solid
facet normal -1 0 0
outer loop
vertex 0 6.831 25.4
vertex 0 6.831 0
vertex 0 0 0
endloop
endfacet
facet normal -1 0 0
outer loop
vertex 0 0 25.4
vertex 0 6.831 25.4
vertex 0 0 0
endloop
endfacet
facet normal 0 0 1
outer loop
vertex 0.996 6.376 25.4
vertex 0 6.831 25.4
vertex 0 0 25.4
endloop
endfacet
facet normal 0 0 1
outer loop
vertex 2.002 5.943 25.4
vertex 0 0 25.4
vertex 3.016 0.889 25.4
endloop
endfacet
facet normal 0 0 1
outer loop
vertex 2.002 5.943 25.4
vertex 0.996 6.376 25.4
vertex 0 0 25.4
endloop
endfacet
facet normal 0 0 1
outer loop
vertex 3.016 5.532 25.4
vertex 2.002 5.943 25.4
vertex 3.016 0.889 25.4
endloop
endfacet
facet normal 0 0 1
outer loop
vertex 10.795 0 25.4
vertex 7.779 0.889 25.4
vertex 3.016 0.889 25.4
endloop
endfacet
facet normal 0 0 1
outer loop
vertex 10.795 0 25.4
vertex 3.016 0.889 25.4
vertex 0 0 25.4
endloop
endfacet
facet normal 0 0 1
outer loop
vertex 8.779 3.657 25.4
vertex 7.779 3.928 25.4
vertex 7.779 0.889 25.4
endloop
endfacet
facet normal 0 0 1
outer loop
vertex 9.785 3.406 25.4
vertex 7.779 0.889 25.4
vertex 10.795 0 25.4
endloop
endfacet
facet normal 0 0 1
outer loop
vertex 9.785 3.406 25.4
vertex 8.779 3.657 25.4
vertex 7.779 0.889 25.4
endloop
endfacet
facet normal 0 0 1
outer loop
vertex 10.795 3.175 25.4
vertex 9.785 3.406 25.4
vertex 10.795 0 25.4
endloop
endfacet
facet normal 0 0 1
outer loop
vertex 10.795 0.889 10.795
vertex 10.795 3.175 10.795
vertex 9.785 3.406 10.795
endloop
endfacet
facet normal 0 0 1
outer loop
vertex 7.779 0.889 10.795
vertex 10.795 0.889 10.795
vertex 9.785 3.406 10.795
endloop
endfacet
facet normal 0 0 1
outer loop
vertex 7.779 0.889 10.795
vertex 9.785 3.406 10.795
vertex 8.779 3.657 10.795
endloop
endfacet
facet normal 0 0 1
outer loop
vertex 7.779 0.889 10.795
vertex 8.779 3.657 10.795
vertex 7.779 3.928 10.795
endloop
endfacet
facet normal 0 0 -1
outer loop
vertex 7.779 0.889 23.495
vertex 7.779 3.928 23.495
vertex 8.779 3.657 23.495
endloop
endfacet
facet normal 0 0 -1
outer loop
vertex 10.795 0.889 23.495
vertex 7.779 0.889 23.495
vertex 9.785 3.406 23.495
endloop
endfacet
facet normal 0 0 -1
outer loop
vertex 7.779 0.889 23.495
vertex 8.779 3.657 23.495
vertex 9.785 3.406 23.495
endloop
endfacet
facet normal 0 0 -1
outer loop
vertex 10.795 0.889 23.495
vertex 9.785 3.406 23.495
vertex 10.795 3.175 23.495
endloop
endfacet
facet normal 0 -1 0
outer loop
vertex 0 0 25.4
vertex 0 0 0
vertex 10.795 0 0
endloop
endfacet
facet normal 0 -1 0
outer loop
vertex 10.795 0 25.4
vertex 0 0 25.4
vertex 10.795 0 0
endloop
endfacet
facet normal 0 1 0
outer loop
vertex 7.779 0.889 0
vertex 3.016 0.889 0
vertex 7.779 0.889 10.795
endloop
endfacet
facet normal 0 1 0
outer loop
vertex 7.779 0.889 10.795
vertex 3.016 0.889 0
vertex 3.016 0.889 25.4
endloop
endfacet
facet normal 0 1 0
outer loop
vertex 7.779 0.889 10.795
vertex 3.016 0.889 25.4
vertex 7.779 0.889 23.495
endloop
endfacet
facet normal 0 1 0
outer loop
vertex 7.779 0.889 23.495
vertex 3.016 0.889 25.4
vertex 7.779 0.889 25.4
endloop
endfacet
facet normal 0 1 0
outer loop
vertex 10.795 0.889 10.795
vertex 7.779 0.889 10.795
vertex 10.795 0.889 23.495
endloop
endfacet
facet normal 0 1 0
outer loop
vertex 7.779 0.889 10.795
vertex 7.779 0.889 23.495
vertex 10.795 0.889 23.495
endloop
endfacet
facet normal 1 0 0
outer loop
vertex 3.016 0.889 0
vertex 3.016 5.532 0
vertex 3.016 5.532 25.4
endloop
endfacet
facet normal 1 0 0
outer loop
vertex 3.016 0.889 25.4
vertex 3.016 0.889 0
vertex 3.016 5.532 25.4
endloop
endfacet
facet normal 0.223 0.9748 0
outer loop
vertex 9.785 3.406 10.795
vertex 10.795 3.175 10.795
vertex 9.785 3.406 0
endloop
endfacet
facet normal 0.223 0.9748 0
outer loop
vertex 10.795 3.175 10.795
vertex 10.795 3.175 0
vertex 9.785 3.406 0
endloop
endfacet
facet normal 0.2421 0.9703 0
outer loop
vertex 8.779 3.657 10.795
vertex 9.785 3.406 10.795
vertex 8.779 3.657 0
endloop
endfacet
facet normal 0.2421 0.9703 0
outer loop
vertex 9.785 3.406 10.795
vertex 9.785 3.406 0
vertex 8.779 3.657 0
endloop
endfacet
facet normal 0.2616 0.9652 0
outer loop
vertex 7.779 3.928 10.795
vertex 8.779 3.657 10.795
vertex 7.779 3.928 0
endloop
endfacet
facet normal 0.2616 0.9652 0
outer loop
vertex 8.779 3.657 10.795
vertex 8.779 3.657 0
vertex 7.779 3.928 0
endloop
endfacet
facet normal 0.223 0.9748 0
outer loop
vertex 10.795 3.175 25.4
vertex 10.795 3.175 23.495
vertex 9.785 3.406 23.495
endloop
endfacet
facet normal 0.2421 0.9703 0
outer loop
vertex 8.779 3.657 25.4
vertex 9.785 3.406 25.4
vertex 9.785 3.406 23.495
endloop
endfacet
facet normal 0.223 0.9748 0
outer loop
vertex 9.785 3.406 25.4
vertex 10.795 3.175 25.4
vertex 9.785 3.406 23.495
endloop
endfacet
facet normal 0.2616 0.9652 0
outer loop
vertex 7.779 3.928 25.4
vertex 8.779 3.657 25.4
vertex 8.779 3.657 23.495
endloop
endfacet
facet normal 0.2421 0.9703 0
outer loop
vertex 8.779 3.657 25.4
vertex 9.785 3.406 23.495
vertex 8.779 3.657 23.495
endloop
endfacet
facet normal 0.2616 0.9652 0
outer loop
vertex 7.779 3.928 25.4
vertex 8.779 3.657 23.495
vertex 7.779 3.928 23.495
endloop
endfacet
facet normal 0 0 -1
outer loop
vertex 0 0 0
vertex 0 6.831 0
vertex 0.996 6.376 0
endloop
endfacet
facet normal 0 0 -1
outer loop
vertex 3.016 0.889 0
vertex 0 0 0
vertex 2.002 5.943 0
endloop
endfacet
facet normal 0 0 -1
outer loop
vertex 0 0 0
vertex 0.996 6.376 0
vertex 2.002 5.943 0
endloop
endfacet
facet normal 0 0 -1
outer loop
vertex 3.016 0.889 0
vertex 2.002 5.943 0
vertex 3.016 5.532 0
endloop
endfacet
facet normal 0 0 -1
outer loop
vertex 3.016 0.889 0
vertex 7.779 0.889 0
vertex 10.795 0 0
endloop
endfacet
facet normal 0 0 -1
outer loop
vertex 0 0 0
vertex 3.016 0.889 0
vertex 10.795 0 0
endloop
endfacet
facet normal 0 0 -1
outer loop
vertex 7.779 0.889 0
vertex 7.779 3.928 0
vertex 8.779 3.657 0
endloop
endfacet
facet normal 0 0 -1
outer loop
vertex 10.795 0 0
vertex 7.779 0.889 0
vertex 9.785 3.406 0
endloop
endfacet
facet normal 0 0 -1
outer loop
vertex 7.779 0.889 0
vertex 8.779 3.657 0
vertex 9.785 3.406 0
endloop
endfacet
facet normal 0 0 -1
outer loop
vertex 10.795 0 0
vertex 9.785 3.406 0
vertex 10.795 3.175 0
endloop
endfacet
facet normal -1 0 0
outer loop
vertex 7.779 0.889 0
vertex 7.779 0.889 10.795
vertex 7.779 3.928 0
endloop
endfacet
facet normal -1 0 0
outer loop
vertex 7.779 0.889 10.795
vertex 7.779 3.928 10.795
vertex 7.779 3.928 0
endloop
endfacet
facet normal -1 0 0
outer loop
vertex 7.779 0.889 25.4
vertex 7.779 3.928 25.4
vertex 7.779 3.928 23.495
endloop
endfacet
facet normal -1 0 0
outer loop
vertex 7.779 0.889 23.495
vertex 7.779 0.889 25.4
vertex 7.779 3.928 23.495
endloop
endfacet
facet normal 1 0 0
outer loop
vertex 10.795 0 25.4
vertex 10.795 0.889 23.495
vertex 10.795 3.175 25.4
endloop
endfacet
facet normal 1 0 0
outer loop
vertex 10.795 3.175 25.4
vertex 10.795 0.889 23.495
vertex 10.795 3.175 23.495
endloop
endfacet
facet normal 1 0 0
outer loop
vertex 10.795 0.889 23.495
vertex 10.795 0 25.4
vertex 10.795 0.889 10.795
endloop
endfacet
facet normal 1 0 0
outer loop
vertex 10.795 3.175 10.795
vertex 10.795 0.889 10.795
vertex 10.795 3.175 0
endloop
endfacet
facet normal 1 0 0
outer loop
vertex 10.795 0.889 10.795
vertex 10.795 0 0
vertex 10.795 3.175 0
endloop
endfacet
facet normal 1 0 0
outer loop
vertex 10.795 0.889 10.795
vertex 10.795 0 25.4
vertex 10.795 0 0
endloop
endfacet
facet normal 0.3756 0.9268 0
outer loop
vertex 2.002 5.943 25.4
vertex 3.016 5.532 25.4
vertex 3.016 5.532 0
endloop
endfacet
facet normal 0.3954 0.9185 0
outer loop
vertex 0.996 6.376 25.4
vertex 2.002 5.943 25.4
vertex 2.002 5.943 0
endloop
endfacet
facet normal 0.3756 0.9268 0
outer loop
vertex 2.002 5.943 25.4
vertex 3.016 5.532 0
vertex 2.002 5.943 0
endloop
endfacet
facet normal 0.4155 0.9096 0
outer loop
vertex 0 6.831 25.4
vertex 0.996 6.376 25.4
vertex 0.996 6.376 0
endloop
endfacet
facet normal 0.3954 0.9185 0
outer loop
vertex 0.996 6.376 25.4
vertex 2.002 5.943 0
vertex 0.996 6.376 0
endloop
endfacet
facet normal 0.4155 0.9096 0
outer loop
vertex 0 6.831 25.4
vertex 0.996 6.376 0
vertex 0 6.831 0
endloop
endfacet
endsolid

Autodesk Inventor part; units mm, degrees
ref_plane "YZ Plane" through (0, 0, 0) normal (1, 0, 0) x (0, 1, 0)
ref_plane "XZ Plane" through (0, 0, 0) normal (0, 1, 0) x (-1, 0, 0)
sketch "Sketch1" plane through (0, 0, 0) normal (0, 0, 1) x (1, 0, 0)
  line L0 (0, 6.831) -> (0, 0)
  line L1 (0, 0) -> (10.795, 0)
  line L2 (10.795, 0) -> (10.795, 3.175)
  arc A0 (0, 6.831) -> (10.795, 3.175) centre (21.59, 52.8148) ccw
  line L3 (10.795, 3.175) -> (21.59, 3.175) construction
  line L4 (21.59, 3.175) -> (21.59, 2.0148) construction
  arc A1 (10.795, 3.175) -> (21.59, 2.0148) centre (21.59, 52.8148) ccw construction
  dimension "d0" = 50.8
  dimension "d4" = 10.795
  dimension "d12" = 3.175
  dimension "d13" = 10.795
extrude "Extrusion1" add sketch "Sketch1" along normal blind 25.4
ref_plane "Work Plane3" through (0, 6.985, 0) normal (0, -1, 0) x (1, 0, 0)
sketch "Sketch4" plane through (0, 6.985, 0) normal (0, -1, 0) x (1, 0, 0)
  line L0 (3.0162, 0) -> (3.0163, 25.4)
  line L1 (0, 25.4) -> (10.795, 25.4) projected
  line L2 (3.0163, 25.4) -> (7.7788, 25.4)
  line L3 (7.7788, 25.4) -> (7.7788, 23.495)
  line L4 (7.7788, 23.495) -> (10.795, 23.495)
  line L5 (10.795, 0) -> (10.795, 25.4) projected
  line L6 (10.795, 23.495) -> (10.795, 10.795)
  line L7 (10.795, 10.795) -> (7.7788, 10.795)
  line L8 (7.7788, 10.795) -> (7.7788, 0)
  line L9 (7.7788, 0) -> (3.0162, 0)
  line L10 (10.795, 0) -> (0, 0) construction
  point P0 (5.3975, 0)
  point P1 (5.3975, 0)
  dimension "d22" = 10.795
  dimension "d23" = 12.7
  dimension "d24" = 4.7625
extrude "Extrusion3" cut sketch "Sketch4" along normal blind 6.096 contours L0 L1 L3 L4 L5 L7 L8 L9
properties part number "WireGuideToSail2" material "ABS Plastic"
